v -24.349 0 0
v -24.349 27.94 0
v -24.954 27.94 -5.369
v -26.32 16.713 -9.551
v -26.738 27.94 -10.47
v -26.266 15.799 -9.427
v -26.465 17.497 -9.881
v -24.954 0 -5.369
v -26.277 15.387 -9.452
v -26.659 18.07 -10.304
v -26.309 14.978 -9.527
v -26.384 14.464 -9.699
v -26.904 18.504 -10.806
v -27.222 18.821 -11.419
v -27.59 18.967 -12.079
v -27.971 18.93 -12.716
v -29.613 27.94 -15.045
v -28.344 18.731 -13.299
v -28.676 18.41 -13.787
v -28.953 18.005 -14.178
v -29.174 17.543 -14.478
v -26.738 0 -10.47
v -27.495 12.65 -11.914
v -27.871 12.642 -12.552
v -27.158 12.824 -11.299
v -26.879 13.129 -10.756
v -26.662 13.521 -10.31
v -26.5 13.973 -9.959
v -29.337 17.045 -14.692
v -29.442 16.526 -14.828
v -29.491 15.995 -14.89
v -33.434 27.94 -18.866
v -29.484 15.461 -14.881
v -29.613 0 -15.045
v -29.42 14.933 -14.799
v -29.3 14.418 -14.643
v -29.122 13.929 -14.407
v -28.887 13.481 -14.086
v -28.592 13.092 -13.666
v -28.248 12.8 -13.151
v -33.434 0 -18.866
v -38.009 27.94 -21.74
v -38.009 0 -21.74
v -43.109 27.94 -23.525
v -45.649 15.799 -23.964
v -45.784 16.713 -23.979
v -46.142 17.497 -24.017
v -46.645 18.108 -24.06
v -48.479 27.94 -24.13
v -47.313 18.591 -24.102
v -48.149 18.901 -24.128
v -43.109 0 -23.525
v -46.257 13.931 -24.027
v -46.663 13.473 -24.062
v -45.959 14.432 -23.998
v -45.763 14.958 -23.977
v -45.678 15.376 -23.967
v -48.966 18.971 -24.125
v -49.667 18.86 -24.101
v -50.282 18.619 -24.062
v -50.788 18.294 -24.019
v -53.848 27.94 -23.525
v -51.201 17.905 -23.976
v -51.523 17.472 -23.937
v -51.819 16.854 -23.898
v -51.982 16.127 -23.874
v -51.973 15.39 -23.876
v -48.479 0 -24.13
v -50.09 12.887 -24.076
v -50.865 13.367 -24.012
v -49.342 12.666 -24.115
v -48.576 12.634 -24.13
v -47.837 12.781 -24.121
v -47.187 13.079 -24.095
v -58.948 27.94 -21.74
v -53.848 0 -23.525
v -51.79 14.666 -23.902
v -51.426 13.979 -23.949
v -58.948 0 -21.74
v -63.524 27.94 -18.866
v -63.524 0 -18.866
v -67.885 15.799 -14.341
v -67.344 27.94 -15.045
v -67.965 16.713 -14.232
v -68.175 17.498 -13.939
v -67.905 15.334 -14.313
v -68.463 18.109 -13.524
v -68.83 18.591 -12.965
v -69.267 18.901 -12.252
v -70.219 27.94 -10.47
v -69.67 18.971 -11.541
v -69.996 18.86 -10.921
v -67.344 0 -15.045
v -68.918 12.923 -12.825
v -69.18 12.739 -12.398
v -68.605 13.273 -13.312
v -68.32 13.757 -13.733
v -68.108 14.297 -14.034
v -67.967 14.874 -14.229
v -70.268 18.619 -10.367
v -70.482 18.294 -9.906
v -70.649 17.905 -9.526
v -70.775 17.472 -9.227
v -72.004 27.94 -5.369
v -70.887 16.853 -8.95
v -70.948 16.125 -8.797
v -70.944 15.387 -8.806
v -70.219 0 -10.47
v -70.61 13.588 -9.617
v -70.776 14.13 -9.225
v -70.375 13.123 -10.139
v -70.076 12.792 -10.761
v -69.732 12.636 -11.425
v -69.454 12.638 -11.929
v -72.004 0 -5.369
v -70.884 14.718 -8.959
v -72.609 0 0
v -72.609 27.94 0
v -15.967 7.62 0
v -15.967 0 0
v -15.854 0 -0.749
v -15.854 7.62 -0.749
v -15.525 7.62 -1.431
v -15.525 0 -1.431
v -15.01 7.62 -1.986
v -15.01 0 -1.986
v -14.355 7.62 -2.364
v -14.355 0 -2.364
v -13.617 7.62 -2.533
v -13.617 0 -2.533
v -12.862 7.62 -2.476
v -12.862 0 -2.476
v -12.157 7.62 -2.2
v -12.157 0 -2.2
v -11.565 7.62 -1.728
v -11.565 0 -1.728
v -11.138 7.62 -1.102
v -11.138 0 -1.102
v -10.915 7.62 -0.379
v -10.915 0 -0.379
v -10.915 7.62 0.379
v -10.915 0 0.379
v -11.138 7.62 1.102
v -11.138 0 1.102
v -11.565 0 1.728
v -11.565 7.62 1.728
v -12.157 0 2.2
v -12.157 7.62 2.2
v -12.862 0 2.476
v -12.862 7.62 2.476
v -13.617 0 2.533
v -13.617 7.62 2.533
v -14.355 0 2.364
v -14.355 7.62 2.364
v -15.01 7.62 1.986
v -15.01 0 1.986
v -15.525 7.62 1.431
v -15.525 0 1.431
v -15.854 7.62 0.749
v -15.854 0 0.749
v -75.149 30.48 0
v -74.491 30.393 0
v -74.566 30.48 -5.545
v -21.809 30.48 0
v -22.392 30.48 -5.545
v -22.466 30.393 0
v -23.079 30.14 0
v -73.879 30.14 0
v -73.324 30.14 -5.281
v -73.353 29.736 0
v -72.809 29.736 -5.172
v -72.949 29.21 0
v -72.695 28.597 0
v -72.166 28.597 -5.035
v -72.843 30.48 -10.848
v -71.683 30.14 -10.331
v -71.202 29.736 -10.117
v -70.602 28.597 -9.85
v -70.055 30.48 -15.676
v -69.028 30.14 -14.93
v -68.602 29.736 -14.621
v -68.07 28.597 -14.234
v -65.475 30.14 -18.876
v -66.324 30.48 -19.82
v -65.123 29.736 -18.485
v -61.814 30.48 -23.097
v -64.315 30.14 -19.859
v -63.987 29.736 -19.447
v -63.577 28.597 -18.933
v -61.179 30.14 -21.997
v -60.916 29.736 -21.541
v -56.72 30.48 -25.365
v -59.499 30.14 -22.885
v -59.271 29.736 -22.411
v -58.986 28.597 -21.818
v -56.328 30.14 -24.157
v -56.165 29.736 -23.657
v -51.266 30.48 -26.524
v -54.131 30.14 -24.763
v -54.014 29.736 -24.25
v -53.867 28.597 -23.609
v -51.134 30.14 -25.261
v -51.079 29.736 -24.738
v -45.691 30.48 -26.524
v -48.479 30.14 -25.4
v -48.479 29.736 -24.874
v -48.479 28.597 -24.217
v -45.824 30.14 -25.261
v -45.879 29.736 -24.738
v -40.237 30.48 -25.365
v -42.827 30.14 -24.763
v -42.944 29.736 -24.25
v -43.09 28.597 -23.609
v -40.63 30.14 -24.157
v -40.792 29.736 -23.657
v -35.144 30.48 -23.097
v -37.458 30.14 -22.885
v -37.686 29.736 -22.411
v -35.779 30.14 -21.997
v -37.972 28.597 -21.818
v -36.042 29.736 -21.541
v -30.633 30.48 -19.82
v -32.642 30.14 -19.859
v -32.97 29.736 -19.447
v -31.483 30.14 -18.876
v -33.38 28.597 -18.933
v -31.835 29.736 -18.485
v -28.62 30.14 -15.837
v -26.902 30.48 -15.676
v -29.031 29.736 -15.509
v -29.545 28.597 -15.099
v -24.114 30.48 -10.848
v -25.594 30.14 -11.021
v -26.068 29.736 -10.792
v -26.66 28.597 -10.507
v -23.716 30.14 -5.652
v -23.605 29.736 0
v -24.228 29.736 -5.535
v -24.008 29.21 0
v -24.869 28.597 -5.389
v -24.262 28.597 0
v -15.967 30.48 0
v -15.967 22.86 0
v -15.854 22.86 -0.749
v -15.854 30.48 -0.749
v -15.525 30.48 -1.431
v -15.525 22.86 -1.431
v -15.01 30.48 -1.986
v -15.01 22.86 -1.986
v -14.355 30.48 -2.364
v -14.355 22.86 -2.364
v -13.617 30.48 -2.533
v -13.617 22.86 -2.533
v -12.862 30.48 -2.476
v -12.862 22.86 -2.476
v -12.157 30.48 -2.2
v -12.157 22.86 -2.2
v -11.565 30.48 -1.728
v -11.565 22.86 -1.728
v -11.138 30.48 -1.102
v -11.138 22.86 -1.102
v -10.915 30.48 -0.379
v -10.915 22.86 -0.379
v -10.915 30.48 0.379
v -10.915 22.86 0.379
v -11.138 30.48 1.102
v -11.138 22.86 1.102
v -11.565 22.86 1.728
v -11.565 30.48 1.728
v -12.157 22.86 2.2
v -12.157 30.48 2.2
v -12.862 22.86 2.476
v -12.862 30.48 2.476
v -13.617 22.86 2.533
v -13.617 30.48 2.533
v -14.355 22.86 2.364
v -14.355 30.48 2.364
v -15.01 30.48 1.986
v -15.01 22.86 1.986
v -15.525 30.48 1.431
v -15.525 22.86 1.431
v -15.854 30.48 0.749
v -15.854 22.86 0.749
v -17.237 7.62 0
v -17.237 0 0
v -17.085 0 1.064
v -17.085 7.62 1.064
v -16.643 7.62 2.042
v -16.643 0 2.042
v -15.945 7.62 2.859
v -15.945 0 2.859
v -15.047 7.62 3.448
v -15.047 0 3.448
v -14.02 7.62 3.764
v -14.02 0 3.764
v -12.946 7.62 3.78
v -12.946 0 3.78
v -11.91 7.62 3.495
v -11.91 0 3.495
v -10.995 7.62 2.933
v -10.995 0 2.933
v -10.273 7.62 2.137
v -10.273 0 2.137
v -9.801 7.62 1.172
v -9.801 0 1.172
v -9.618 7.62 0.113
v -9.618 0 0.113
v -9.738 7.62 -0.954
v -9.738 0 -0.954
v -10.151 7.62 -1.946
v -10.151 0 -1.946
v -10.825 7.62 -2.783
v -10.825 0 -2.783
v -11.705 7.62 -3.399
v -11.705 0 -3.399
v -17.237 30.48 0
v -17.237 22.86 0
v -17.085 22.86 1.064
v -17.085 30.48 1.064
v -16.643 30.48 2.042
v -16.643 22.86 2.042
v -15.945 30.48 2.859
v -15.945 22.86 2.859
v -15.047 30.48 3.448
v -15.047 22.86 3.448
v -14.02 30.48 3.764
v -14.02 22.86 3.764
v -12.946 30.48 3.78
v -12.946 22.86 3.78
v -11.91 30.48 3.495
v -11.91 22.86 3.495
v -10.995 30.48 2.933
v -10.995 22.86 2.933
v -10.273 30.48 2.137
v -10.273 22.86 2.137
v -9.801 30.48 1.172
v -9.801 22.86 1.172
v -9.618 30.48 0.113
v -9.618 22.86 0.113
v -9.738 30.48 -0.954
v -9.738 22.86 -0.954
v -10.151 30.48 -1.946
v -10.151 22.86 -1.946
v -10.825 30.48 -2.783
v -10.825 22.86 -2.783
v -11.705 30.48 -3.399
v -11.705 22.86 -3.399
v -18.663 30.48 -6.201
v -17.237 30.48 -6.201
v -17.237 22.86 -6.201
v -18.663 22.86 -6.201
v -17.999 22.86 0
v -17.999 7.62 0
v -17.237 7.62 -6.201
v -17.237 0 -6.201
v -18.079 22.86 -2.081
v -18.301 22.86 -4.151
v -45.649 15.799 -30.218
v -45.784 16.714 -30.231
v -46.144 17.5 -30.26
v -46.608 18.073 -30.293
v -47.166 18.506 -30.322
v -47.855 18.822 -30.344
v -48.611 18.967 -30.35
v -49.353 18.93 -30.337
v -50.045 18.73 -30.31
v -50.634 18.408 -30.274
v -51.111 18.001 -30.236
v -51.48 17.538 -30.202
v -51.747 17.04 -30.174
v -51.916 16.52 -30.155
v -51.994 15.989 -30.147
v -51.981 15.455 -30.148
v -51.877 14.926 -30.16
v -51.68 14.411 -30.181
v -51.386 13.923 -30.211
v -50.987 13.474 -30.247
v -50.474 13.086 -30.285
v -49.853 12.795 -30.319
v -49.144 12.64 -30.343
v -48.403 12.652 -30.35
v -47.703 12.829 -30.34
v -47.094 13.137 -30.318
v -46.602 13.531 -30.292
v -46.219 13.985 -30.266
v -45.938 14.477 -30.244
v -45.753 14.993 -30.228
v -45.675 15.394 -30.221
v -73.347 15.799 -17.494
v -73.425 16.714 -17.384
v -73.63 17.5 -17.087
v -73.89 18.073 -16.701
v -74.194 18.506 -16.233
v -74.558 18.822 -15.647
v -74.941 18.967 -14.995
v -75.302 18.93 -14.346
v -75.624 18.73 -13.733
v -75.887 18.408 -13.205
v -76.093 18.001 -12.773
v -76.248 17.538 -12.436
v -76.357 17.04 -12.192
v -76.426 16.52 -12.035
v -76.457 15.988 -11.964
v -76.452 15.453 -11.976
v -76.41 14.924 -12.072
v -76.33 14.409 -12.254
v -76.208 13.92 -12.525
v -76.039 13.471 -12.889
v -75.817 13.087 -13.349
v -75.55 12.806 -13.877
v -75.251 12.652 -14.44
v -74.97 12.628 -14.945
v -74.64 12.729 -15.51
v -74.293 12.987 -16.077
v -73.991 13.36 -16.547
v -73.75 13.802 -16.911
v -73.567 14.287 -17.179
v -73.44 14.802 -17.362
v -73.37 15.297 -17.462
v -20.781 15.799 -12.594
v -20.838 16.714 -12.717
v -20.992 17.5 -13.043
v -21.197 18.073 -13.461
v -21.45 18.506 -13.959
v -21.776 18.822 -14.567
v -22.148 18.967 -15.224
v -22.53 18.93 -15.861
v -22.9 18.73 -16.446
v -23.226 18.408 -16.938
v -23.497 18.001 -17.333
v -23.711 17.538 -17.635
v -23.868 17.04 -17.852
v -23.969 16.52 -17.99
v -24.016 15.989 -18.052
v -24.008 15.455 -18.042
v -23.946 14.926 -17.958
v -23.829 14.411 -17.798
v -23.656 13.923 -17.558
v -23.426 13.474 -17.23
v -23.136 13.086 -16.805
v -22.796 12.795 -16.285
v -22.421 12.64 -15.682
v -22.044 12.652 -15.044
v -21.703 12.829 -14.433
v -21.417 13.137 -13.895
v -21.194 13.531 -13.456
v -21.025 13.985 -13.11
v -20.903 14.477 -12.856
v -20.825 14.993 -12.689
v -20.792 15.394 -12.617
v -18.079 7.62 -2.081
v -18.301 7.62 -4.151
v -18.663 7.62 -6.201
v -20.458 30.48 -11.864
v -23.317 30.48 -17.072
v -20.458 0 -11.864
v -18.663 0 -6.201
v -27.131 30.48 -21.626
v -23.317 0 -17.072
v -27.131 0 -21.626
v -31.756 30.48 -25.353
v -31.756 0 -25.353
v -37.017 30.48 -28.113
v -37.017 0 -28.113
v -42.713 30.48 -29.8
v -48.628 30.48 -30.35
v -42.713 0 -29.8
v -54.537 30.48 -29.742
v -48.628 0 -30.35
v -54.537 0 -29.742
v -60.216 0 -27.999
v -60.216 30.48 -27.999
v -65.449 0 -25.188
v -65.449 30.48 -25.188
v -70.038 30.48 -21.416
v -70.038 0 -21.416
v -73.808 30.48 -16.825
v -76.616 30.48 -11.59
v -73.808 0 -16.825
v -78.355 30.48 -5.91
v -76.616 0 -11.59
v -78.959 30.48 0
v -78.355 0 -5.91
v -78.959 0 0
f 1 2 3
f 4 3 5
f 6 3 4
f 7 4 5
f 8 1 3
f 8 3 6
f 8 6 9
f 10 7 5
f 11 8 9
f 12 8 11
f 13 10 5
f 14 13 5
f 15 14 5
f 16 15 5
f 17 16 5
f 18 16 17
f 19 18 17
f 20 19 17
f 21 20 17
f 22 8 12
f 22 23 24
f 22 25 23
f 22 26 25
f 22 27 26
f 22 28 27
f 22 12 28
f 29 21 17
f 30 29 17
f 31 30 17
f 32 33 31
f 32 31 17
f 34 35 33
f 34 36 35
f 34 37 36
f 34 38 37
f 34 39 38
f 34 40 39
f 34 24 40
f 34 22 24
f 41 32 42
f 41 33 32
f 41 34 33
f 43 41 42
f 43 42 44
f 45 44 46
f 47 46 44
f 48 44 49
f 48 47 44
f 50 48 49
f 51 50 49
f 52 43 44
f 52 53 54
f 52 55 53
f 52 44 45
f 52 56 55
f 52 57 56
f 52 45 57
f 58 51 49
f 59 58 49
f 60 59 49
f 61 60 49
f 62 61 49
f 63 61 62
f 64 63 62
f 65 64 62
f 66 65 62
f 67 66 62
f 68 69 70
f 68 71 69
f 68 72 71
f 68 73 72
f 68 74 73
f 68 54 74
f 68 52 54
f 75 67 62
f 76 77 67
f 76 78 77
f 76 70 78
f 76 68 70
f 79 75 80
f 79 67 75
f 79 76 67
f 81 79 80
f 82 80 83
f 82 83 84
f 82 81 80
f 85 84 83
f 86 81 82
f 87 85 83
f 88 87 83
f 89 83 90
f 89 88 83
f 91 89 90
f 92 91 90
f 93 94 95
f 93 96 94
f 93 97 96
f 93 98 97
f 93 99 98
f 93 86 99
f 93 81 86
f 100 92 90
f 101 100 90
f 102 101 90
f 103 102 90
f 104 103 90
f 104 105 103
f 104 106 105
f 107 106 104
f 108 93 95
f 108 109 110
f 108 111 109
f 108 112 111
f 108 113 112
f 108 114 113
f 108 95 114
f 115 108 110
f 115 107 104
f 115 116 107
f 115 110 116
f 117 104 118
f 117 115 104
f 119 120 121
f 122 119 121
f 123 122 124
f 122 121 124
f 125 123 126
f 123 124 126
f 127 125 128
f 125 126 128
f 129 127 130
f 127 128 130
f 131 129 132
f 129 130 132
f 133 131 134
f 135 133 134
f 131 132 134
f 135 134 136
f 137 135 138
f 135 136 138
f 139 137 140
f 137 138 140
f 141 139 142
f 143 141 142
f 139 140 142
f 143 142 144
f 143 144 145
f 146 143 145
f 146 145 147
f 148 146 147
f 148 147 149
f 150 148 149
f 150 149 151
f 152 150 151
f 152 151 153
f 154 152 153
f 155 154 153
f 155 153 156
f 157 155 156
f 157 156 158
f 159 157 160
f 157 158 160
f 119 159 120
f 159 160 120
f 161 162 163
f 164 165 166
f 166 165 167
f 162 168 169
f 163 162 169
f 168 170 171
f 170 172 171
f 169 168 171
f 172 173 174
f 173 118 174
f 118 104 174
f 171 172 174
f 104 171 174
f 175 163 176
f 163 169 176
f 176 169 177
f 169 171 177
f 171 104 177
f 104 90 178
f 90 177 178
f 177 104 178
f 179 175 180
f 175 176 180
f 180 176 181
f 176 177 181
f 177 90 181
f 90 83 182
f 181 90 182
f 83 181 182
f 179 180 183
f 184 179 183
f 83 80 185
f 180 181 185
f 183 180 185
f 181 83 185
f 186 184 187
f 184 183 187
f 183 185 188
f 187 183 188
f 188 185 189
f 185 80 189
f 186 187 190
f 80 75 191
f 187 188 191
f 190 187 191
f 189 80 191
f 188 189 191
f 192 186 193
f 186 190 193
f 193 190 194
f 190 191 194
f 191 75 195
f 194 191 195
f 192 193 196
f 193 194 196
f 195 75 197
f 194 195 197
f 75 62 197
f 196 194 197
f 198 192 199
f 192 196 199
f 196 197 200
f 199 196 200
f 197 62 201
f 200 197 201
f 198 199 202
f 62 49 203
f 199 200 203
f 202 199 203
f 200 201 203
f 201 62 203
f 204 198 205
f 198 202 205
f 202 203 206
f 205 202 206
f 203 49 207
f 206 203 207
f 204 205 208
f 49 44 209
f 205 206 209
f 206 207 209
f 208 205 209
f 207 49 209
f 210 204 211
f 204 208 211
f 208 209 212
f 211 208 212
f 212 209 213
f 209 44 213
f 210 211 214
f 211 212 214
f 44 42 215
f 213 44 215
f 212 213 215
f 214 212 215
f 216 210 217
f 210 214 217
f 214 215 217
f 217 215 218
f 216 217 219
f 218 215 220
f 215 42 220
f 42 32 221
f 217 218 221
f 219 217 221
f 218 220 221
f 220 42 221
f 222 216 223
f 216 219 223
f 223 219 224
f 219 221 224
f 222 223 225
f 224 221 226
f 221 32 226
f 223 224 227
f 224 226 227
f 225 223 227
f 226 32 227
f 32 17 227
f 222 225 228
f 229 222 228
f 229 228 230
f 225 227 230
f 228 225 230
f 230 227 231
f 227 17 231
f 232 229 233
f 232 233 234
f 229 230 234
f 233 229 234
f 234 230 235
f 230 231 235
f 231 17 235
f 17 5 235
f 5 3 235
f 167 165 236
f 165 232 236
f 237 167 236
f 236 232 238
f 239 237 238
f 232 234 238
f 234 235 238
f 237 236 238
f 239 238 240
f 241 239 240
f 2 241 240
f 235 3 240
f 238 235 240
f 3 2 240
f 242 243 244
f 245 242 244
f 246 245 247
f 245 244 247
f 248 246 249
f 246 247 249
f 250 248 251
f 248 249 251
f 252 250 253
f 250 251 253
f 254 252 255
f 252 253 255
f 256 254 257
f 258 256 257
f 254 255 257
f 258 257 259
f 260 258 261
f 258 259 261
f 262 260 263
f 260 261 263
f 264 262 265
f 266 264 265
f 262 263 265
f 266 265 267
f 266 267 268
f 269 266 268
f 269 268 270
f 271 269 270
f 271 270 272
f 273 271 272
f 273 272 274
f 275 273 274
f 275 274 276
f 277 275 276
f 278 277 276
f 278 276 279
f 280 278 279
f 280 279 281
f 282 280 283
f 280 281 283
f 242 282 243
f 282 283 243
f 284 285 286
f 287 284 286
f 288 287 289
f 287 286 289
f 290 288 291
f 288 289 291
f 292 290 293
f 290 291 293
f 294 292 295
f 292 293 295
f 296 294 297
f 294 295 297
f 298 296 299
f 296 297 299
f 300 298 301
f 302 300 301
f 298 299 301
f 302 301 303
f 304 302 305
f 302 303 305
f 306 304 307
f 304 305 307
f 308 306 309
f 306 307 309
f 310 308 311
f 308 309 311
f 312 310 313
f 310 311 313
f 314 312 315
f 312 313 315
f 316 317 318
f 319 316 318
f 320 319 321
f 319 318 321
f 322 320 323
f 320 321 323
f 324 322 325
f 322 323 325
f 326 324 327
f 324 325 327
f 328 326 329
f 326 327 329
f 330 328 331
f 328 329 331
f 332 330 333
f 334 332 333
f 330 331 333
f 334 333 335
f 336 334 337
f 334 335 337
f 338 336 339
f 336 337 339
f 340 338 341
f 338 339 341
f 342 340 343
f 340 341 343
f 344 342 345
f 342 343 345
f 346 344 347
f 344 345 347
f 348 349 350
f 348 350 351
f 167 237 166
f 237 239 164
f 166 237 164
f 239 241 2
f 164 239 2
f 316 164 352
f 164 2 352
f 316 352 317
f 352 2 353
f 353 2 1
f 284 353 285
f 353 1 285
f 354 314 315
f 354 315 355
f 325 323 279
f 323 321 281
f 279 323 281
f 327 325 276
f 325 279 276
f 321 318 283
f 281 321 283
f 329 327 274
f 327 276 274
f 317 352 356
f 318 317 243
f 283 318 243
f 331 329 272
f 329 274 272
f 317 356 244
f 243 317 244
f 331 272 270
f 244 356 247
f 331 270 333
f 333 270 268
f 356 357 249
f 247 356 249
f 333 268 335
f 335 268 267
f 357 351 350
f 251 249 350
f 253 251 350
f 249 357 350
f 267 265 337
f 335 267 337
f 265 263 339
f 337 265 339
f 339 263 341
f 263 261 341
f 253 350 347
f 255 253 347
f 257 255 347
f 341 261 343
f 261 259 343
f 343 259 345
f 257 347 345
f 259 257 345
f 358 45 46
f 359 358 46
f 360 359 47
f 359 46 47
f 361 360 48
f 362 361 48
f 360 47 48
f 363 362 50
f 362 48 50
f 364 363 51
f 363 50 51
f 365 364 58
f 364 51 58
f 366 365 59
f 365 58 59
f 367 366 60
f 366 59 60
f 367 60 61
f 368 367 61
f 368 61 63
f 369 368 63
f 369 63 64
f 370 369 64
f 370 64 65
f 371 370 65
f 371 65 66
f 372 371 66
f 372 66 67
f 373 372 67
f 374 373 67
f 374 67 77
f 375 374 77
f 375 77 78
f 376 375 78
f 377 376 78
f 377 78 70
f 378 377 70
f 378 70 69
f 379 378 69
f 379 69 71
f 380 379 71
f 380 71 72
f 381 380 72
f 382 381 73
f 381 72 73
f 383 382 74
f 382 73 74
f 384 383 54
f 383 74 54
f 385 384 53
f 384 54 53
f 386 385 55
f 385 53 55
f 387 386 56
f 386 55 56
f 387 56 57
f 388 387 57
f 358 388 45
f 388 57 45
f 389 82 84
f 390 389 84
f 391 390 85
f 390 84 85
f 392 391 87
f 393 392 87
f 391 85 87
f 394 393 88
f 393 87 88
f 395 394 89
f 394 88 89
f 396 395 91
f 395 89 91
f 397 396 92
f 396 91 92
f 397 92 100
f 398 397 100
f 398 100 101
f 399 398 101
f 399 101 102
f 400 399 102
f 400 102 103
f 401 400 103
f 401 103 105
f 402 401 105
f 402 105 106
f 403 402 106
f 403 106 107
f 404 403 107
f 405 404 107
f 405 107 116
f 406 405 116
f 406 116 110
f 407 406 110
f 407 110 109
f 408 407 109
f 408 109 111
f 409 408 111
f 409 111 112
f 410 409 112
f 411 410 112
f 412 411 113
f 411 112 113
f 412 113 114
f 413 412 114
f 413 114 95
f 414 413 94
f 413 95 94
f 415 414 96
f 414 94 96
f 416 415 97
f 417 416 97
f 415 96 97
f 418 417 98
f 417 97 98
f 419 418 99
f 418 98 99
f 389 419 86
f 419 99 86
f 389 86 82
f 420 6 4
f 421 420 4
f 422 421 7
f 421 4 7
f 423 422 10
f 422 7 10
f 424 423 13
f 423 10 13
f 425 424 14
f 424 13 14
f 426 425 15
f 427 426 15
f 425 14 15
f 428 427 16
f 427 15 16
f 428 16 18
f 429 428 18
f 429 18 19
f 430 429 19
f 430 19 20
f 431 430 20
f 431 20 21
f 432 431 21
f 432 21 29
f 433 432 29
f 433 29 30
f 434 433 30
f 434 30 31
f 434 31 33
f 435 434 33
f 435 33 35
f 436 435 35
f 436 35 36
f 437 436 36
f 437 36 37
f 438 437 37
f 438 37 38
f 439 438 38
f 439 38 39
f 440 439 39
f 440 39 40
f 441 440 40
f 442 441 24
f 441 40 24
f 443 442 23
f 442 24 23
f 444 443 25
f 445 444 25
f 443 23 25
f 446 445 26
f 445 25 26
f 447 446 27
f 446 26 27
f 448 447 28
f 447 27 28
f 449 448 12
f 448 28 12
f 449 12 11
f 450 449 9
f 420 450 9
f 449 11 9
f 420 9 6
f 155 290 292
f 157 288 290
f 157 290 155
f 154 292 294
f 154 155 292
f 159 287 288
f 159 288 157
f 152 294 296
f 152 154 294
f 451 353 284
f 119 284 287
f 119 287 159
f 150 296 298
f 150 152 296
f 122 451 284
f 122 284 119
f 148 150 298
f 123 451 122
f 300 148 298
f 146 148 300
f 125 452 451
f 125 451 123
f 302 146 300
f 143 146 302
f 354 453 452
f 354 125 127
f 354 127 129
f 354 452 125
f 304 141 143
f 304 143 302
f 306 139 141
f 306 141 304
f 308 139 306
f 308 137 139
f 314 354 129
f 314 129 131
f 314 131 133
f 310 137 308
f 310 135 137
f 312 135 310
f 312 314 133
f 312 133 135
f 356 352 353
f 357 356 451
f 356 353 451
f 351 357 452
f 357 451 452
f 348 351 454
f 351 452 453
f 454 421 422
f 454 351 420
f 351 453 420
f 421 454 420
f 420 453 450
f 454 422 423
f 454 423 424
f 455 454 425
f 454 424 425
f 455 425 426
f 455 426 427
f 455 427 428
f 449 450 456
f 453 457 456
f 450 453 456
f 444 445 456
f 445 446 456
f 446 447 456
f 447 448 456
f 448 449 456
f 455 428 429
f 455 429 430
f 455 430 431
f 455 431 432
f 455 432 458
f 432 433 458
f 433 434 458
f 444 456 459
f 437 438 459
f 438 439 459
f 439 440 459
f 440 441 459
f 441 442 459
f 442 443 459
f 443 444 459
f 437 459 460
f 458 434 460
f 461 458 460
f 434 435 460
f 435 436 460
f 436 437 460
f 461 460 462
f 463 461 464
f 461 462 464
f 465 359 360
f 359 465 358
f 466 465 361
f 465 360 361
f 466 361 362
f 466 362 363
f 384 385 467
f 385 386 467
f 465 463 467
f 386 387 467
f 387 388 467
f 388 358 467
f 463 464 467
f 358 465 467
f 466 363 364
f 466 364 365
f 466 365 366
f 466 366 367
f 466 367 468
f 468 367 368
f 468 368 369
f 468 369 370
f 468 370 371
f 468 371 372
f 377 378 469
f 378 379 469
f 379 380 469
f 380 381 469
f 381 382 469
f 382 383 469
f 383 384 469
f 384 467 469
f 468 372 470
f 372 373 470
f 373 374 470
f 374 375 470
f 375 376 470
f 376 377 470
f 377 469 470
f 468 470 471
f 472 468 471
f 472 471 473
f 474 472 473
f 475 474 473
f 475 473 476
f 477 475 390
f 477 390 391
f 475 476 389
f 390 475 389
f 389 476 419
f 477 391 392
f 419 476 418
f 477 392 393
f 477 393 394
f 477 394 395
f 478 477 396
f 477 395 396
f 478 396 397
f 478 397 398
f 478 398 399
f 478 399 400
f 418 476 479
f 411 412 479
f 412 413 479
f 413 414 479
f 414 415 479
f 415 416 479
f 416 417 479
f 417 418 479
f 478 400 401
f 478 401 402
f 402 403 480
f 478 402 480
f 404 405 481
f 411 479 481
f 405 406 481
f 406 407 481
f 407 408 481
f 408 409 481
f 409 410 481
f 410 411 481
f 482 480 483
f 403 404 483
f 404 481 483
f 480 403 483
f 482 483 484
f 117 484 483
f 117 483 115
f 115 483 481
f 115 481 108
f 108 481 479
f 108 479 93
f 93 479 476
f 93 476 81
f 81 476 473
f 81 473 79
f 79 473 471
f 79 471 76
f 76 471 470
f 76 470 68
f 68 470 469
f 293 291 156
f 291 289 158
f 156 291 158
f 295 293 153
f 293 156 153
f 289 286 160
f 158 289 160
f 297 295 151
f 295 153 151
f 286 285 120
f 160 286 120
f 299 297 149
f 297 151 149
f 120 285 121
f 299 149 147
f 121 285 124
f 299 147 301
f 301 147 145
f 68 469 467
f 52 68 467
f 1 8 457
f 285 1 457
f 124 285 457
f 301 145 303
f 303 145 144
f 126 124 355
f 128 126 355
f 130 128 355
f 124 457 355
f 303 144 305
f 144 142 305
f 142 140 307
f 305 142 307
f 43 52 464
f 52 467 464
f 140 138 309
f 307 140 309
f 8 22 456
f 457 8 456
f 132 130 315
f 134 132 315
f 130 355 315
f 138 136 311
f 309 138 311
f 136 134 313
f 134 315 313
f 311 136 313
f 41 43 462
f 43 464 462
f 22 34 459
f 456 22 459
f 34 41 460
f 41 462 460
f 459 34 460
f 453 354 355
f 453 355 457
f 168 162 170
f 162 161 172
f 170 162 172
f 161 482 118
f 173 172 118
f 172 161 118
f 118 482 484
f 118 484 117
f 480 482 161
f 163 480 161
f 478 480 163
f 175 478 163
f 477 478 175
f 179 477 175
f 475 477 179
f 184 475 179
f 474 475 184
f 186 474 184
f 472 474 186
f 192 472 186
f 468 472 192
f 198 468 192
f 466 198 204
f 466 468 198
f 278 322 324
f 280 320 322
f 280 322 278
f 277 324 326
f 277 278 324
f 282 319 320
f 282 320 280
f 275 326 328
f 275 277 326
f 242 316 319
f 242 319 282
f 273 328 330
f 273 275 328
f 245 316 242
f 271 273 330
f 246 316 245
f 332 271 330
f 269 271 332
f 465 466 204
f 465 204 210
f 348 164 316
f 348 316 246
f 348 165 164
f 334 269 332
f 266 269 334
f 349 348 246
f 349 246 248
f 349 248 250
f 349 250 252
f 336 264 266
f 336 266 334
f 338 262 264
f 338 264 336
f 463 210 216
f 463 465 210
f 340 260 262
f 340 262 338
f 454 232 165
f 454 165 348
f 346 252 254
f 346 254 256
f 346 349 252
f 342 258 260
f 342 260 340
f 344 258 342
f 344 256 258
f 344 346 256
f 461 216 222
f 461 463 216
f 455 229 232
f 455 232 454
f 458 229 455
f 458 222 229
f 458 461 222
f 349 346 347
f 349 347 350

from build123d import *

# Parameters (mm, degrees)
BOSS_EXTRUDE1_DEPTH = 30.48
SKETCH3_R           = 24.13
CUT_EXTRUDE4_DEPTH  = 90.914560616
SKETCH4_R           = 3.175
CUT_EXTRUDE5_DEPTH  = 63.754
CIRPATTERN3_COUNT   = 6
BOSS_EXTRUDE2_START = -7.62
BOSS_EXTRUDE2_DEPTH = 7.62
LPATTERN1_COUNT     = 2
LPATTERN1_PITCH     = 22.86
FILLET1_R           = 2.54


with BuildPart() as part:
    # Sketch1 → Boss-Extrude1 (new body)
    with BuildSketch(Plane(origin=(0, 0, 0), x_dir=(1, 0, 0), z_dir=(0, 1, 0))):
        with BuildLine():
            Line((-78.958715675, 0), (-17.998715675, 0))
            ThreePointArc((-17.998715675, 0), (-48.478715675, 30.349942827), (-78.958715675, 0))
        make_face()
    extrude(amount=BOSS_EXTRUDE1_DEPTH)

    # Sketch3 → Cut-Extrude4 (cut, through all)
    with BuildSketch(Plane(origin=(0, 0, 0), x_dir=(1, 0, 0), z_dir=(0, 1, 0))):
        with Locations((-48.478715675, 0)):
            Circle(SKETCH3_R)
    extrude(amount=CUT_EXTRUDE4_DEPTH, mode=Mode.SUBTRACT)

    # Sketch4 → Cut-Extrude5 (cut)
    with BuildSketch(Plane.XY):
        with Locations((-48.824364134, 15.798935299)):
            Circle(SKETCH4_R)
    cut_extrude5 = extrude(amount=-CUT_EXTRUDE5_DEPTH, mode=Mode.SUBTRACT)

    # CirPattern3: Cut-Extrude5 ×6 about axis
    cirpattern3_axis = Axis((-48.478715675, 30.48, 0.130335837), (0, -1, 0))
    for i in range(1, CIRPATTERN3_COUNT):
        add(cut_extrude5.rotate(cirpattern3_axis, i * 360 / CIRPATTERN3_COUNT), mode=Mode.SUBTRACT)

    # Sketch5 → Boss-Extrude2 (add)
    with BuildSketch(Plane(origin=(0, 30.48, 0), x_dir=(1, 0, 0), z_dir=(0, 1, 0)).offset(BOSS_EXTRUDE2_START)):
        with BuildLine():
            Line((-17.998715675, 0), (-17.236715675, 0))
            ThreePointArc((-17.236715675, 0), (-11.432288754, -3.246284223), (-11.704767509, 3.398675405))
            Line((-11.704767509, 3.398675405), (-17.236715675, 6.201452036))
            Line((-17.236715675, 6.201452036), (-18.252715675, 6.201452036))
            Line((-18.252715675, 6.201452036), (-18.663353029, 6.201452036))
            ThreePointArc((-18.663353029, 6.201452036), (-18.171997096, 3.117770752), (-17.998715675, 0))
        make_face()
        with BuildLine():
            ThreePointArc((-10.886715675, 0), (-13.426715675, -2.54), (-15.966715675, 0))
            ThreePointArc((-15.966715675, 0), (-13.426715675, 2.54), (-10.886715675, 0))
        make_face(mode=Mode.SUBTRACT)
    boss_extrude2 = extrude(amount=BOSS_EXTRUDE2_DEPTH)

    # LPattern1: Boss-Extrude2 ×2
    with Locations(*[(0, -i * LPATTERN1_PITCH, 0) for i in range(1, LPATTERN1_COUNT)]):
        add(boss_extrude2)

    # Fillet1
    fillet1_edges = [part.edges().sort_by_distance(p)[0] for p in [
        (-48.478715675, 30.48, -24.13),
    ]]
    fillet(fillet1_edges, radius=FILLET1_R)


solid = part.part
